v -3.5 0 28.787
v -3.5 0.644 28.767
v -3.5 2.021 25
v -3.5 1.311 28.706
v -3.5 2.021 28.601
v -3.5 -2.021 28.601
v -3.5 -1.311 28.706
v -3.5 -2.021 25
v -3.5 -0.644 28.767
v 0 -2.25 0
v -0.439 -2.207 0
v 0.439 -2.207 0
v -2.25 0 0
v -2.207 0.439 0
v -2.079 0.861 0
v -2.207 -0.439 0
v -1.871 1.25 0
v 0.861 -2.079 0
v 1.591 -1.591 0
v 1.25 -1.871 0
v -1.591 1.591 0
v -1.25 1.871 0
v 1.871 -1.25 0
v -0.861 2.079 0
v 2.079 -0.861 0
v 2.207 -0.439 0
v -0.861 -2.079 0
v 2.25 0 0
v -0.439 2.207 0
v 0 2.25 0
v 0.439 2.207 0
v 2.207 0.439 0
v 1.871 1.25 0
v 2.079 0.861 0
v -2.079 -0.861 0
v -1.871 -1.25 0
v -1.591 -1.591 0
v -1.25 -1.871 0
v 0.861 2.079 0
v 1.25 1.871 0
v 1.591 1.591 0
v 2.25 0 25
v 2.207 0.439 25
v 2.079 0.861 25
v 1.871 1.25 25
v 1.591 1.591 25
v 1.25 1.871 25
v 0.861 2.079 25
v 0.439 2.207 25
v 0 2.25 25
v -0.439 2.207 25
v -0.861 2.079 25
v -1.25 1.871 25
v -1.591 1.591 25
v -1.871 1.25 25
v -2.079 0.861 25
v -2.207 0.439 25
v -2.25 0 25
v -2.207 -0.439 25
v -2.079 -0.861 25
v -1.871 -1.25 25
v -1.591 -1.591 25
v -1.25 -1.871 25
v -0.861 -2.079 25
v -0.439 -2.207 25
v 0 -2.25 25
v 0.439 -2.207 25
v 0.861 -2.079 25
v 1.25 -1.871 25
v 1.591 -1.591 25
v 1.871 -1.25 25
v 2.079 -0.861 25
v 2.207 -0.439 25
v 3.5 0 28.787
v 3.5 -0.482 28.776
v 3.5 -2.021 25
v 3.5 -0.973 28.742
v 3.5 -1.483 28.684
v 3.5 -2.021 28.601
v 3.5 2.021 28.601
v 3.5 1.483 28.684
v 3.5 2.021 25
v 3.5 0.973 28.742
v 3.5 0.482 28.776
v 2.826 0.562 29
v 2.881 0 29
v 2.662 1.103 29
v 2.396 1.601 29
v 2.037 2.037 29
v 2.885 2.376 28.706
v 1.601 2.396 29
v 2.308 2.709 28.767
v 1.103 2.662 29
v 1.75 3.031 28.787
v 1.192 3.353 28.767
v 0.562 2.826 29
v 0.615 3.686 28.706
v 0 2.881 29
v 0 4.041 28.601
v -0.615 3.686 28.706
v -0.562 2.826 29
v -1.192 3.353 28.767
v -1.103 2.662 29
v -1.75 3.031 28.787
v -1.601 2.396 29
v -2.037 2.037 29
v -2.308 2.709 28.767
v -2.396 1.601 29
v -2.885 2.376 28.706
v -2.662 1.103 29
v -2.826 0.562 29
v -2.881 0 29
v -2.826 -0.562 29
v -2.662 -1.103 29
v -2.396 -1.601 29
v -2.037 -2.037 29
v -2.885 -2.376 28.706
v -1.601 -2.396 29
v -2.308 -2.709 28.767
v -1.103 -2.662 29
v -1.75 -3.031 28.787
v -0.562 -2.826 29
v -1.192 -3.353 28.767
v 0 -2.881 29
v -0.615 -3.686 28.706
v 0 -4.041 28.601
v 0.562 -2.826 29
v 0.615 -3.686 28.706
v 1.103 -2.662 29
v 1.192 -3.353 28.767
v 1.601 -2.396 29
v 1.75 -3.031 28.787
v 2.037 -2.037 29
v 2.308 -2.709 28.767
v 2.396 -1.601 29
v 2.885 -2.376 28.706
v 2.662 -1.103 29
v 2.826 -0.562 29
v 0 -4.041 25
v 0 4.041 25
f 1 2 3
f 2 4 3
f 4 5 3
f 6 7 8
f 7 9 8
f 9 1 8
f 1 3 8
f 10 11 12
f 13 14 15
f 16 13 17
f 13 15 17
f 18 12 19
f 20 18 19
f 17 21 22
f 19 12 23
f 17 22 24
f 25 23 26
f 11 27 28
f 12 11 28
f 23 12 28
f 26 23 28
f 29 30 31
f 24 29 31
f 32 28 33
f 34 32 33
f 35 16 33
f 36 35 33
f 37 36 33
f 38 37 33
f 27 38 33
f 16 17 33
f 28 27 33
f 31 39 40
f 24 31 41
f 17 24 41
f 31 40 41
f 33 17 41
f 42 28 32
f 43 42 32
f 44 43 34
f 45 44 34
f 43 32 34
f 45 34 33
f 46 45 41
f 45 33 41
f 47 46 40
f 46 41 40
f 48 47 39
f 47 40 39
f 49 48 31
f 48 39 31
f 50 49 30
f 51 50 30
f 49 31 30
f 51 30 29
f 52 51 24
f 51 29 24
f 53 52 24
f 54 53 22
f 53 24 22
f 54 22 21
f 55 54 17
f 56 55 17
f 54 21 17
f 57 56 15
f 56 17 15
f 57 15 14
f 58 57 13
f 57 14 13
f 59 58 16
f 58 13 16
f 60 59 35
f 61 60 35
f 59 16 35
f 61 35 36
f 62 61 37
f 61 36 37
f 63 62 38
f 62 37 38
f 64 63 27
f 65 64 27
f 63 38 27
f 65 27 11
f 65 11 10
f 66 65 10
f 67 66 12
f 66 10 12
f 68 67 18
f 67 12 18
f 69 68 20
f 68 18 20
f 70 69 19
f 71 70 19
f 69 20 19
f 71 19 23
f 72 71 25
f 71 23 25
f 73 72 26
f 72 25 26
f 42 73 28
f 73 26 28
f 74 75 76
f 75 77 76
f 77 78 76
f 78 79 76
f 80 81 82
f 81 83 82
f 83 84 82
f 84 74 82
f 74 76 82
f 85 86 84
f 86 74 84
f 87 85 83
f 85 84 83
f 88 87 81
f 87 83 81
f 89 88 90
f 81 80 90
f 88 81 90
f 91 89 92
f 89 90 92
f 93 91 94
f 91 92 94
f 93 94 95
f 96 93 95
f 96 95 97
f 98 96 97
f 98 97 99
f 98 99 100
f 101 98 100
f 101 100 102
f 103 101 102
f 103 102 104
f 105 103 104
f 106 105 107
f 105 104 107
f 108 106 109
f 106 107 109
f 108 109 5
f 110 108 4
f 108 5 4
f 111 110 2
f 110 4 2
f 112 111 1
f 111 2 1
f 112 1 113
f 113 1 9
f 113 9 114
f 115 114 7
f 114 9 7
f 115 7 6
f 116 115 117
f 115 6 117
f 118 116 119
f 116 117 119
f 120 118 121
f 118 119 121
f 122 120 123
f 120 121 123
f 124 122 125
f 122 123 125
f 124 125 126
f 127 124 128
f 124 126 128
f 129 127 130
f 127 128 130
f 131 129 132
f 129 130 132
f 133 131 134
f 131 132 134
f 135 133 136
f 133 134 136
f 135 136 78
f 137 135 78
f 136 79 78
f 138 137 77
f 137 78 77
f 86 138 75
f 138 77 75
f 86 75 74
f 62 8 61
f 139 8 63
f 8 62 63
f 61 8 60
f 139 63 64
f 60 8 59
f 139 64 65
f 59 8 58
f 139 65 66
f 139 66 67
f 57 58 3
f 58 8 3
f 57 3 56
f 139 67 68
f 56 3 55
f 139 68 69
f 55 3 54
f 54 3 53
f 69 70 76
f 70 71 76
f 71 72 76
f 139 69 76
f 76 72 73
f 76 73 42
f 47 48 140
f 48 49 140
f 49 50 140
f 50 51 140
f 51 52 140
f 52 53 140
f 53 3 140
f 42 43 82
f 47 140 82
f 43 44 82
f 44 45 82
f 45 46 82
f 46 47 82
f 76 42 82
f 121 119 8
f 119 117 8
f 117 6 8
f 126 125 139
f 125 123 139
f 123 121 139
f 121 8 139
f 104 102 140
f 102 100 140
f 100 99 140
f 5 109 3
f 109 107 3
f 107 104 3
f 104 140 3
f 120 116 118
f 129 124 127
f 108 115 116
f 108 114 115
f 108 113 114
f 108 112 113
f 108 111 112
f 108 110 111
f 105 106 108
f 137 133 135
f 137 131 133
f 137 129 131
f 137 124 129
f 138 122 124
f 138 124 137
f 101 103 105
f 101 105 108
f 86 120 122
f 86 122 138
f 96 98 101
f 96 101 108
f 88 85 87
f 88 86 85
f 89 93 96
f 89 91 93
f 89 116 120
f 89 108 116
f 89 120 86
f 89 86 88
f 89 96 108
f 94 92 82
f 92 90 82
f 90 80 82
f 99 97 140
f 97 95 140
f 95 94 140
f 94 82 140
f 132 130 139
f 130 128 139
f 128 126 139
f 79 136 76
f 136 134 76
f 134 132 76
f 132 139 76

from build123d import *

# Parameters (mm, degrees)
SKETCH_R     = 2.25
PAD_DEPTH    = 25
PAD001_DEPTH = 4


with BuildPart() as revolution:
    # Sketch002 → Revolution (revolve)
    with BuildSketch(Plane.XZ):
        Polygon((0, 29.182125), (2.351471, 29.182125), (4.653152, 28.390949), (4.653152, 29.641115), (0, 29.641115), align=None)
    revolve(axis=Axis((0, 0, 0), (0, 0, 1)))


with BuildPart() as tornillo:
    # Sketch → Pad (new body)
    with BuildSketch(Plane.XY):
        Circle(SKETCH_R)
    extrude(amount=PAD_DEPTH)

    # Sketch001 → Pad001 (new body)
    with BuildSketch(Plane.XY.offset(25)):
        Polygon((3.5, 2.020726), (0, 4.041452), (-3.5, 2.020726), (-3.5, -2.020726), (0, -4.041452), (3.5, -2.020726), align=None)
    extrude(amount=PAD001_DEPTH)

    # Cut: cut Revolution
    add(revolution.part, mode=Mode.SUBTRACT)


solid = tornillo.part
